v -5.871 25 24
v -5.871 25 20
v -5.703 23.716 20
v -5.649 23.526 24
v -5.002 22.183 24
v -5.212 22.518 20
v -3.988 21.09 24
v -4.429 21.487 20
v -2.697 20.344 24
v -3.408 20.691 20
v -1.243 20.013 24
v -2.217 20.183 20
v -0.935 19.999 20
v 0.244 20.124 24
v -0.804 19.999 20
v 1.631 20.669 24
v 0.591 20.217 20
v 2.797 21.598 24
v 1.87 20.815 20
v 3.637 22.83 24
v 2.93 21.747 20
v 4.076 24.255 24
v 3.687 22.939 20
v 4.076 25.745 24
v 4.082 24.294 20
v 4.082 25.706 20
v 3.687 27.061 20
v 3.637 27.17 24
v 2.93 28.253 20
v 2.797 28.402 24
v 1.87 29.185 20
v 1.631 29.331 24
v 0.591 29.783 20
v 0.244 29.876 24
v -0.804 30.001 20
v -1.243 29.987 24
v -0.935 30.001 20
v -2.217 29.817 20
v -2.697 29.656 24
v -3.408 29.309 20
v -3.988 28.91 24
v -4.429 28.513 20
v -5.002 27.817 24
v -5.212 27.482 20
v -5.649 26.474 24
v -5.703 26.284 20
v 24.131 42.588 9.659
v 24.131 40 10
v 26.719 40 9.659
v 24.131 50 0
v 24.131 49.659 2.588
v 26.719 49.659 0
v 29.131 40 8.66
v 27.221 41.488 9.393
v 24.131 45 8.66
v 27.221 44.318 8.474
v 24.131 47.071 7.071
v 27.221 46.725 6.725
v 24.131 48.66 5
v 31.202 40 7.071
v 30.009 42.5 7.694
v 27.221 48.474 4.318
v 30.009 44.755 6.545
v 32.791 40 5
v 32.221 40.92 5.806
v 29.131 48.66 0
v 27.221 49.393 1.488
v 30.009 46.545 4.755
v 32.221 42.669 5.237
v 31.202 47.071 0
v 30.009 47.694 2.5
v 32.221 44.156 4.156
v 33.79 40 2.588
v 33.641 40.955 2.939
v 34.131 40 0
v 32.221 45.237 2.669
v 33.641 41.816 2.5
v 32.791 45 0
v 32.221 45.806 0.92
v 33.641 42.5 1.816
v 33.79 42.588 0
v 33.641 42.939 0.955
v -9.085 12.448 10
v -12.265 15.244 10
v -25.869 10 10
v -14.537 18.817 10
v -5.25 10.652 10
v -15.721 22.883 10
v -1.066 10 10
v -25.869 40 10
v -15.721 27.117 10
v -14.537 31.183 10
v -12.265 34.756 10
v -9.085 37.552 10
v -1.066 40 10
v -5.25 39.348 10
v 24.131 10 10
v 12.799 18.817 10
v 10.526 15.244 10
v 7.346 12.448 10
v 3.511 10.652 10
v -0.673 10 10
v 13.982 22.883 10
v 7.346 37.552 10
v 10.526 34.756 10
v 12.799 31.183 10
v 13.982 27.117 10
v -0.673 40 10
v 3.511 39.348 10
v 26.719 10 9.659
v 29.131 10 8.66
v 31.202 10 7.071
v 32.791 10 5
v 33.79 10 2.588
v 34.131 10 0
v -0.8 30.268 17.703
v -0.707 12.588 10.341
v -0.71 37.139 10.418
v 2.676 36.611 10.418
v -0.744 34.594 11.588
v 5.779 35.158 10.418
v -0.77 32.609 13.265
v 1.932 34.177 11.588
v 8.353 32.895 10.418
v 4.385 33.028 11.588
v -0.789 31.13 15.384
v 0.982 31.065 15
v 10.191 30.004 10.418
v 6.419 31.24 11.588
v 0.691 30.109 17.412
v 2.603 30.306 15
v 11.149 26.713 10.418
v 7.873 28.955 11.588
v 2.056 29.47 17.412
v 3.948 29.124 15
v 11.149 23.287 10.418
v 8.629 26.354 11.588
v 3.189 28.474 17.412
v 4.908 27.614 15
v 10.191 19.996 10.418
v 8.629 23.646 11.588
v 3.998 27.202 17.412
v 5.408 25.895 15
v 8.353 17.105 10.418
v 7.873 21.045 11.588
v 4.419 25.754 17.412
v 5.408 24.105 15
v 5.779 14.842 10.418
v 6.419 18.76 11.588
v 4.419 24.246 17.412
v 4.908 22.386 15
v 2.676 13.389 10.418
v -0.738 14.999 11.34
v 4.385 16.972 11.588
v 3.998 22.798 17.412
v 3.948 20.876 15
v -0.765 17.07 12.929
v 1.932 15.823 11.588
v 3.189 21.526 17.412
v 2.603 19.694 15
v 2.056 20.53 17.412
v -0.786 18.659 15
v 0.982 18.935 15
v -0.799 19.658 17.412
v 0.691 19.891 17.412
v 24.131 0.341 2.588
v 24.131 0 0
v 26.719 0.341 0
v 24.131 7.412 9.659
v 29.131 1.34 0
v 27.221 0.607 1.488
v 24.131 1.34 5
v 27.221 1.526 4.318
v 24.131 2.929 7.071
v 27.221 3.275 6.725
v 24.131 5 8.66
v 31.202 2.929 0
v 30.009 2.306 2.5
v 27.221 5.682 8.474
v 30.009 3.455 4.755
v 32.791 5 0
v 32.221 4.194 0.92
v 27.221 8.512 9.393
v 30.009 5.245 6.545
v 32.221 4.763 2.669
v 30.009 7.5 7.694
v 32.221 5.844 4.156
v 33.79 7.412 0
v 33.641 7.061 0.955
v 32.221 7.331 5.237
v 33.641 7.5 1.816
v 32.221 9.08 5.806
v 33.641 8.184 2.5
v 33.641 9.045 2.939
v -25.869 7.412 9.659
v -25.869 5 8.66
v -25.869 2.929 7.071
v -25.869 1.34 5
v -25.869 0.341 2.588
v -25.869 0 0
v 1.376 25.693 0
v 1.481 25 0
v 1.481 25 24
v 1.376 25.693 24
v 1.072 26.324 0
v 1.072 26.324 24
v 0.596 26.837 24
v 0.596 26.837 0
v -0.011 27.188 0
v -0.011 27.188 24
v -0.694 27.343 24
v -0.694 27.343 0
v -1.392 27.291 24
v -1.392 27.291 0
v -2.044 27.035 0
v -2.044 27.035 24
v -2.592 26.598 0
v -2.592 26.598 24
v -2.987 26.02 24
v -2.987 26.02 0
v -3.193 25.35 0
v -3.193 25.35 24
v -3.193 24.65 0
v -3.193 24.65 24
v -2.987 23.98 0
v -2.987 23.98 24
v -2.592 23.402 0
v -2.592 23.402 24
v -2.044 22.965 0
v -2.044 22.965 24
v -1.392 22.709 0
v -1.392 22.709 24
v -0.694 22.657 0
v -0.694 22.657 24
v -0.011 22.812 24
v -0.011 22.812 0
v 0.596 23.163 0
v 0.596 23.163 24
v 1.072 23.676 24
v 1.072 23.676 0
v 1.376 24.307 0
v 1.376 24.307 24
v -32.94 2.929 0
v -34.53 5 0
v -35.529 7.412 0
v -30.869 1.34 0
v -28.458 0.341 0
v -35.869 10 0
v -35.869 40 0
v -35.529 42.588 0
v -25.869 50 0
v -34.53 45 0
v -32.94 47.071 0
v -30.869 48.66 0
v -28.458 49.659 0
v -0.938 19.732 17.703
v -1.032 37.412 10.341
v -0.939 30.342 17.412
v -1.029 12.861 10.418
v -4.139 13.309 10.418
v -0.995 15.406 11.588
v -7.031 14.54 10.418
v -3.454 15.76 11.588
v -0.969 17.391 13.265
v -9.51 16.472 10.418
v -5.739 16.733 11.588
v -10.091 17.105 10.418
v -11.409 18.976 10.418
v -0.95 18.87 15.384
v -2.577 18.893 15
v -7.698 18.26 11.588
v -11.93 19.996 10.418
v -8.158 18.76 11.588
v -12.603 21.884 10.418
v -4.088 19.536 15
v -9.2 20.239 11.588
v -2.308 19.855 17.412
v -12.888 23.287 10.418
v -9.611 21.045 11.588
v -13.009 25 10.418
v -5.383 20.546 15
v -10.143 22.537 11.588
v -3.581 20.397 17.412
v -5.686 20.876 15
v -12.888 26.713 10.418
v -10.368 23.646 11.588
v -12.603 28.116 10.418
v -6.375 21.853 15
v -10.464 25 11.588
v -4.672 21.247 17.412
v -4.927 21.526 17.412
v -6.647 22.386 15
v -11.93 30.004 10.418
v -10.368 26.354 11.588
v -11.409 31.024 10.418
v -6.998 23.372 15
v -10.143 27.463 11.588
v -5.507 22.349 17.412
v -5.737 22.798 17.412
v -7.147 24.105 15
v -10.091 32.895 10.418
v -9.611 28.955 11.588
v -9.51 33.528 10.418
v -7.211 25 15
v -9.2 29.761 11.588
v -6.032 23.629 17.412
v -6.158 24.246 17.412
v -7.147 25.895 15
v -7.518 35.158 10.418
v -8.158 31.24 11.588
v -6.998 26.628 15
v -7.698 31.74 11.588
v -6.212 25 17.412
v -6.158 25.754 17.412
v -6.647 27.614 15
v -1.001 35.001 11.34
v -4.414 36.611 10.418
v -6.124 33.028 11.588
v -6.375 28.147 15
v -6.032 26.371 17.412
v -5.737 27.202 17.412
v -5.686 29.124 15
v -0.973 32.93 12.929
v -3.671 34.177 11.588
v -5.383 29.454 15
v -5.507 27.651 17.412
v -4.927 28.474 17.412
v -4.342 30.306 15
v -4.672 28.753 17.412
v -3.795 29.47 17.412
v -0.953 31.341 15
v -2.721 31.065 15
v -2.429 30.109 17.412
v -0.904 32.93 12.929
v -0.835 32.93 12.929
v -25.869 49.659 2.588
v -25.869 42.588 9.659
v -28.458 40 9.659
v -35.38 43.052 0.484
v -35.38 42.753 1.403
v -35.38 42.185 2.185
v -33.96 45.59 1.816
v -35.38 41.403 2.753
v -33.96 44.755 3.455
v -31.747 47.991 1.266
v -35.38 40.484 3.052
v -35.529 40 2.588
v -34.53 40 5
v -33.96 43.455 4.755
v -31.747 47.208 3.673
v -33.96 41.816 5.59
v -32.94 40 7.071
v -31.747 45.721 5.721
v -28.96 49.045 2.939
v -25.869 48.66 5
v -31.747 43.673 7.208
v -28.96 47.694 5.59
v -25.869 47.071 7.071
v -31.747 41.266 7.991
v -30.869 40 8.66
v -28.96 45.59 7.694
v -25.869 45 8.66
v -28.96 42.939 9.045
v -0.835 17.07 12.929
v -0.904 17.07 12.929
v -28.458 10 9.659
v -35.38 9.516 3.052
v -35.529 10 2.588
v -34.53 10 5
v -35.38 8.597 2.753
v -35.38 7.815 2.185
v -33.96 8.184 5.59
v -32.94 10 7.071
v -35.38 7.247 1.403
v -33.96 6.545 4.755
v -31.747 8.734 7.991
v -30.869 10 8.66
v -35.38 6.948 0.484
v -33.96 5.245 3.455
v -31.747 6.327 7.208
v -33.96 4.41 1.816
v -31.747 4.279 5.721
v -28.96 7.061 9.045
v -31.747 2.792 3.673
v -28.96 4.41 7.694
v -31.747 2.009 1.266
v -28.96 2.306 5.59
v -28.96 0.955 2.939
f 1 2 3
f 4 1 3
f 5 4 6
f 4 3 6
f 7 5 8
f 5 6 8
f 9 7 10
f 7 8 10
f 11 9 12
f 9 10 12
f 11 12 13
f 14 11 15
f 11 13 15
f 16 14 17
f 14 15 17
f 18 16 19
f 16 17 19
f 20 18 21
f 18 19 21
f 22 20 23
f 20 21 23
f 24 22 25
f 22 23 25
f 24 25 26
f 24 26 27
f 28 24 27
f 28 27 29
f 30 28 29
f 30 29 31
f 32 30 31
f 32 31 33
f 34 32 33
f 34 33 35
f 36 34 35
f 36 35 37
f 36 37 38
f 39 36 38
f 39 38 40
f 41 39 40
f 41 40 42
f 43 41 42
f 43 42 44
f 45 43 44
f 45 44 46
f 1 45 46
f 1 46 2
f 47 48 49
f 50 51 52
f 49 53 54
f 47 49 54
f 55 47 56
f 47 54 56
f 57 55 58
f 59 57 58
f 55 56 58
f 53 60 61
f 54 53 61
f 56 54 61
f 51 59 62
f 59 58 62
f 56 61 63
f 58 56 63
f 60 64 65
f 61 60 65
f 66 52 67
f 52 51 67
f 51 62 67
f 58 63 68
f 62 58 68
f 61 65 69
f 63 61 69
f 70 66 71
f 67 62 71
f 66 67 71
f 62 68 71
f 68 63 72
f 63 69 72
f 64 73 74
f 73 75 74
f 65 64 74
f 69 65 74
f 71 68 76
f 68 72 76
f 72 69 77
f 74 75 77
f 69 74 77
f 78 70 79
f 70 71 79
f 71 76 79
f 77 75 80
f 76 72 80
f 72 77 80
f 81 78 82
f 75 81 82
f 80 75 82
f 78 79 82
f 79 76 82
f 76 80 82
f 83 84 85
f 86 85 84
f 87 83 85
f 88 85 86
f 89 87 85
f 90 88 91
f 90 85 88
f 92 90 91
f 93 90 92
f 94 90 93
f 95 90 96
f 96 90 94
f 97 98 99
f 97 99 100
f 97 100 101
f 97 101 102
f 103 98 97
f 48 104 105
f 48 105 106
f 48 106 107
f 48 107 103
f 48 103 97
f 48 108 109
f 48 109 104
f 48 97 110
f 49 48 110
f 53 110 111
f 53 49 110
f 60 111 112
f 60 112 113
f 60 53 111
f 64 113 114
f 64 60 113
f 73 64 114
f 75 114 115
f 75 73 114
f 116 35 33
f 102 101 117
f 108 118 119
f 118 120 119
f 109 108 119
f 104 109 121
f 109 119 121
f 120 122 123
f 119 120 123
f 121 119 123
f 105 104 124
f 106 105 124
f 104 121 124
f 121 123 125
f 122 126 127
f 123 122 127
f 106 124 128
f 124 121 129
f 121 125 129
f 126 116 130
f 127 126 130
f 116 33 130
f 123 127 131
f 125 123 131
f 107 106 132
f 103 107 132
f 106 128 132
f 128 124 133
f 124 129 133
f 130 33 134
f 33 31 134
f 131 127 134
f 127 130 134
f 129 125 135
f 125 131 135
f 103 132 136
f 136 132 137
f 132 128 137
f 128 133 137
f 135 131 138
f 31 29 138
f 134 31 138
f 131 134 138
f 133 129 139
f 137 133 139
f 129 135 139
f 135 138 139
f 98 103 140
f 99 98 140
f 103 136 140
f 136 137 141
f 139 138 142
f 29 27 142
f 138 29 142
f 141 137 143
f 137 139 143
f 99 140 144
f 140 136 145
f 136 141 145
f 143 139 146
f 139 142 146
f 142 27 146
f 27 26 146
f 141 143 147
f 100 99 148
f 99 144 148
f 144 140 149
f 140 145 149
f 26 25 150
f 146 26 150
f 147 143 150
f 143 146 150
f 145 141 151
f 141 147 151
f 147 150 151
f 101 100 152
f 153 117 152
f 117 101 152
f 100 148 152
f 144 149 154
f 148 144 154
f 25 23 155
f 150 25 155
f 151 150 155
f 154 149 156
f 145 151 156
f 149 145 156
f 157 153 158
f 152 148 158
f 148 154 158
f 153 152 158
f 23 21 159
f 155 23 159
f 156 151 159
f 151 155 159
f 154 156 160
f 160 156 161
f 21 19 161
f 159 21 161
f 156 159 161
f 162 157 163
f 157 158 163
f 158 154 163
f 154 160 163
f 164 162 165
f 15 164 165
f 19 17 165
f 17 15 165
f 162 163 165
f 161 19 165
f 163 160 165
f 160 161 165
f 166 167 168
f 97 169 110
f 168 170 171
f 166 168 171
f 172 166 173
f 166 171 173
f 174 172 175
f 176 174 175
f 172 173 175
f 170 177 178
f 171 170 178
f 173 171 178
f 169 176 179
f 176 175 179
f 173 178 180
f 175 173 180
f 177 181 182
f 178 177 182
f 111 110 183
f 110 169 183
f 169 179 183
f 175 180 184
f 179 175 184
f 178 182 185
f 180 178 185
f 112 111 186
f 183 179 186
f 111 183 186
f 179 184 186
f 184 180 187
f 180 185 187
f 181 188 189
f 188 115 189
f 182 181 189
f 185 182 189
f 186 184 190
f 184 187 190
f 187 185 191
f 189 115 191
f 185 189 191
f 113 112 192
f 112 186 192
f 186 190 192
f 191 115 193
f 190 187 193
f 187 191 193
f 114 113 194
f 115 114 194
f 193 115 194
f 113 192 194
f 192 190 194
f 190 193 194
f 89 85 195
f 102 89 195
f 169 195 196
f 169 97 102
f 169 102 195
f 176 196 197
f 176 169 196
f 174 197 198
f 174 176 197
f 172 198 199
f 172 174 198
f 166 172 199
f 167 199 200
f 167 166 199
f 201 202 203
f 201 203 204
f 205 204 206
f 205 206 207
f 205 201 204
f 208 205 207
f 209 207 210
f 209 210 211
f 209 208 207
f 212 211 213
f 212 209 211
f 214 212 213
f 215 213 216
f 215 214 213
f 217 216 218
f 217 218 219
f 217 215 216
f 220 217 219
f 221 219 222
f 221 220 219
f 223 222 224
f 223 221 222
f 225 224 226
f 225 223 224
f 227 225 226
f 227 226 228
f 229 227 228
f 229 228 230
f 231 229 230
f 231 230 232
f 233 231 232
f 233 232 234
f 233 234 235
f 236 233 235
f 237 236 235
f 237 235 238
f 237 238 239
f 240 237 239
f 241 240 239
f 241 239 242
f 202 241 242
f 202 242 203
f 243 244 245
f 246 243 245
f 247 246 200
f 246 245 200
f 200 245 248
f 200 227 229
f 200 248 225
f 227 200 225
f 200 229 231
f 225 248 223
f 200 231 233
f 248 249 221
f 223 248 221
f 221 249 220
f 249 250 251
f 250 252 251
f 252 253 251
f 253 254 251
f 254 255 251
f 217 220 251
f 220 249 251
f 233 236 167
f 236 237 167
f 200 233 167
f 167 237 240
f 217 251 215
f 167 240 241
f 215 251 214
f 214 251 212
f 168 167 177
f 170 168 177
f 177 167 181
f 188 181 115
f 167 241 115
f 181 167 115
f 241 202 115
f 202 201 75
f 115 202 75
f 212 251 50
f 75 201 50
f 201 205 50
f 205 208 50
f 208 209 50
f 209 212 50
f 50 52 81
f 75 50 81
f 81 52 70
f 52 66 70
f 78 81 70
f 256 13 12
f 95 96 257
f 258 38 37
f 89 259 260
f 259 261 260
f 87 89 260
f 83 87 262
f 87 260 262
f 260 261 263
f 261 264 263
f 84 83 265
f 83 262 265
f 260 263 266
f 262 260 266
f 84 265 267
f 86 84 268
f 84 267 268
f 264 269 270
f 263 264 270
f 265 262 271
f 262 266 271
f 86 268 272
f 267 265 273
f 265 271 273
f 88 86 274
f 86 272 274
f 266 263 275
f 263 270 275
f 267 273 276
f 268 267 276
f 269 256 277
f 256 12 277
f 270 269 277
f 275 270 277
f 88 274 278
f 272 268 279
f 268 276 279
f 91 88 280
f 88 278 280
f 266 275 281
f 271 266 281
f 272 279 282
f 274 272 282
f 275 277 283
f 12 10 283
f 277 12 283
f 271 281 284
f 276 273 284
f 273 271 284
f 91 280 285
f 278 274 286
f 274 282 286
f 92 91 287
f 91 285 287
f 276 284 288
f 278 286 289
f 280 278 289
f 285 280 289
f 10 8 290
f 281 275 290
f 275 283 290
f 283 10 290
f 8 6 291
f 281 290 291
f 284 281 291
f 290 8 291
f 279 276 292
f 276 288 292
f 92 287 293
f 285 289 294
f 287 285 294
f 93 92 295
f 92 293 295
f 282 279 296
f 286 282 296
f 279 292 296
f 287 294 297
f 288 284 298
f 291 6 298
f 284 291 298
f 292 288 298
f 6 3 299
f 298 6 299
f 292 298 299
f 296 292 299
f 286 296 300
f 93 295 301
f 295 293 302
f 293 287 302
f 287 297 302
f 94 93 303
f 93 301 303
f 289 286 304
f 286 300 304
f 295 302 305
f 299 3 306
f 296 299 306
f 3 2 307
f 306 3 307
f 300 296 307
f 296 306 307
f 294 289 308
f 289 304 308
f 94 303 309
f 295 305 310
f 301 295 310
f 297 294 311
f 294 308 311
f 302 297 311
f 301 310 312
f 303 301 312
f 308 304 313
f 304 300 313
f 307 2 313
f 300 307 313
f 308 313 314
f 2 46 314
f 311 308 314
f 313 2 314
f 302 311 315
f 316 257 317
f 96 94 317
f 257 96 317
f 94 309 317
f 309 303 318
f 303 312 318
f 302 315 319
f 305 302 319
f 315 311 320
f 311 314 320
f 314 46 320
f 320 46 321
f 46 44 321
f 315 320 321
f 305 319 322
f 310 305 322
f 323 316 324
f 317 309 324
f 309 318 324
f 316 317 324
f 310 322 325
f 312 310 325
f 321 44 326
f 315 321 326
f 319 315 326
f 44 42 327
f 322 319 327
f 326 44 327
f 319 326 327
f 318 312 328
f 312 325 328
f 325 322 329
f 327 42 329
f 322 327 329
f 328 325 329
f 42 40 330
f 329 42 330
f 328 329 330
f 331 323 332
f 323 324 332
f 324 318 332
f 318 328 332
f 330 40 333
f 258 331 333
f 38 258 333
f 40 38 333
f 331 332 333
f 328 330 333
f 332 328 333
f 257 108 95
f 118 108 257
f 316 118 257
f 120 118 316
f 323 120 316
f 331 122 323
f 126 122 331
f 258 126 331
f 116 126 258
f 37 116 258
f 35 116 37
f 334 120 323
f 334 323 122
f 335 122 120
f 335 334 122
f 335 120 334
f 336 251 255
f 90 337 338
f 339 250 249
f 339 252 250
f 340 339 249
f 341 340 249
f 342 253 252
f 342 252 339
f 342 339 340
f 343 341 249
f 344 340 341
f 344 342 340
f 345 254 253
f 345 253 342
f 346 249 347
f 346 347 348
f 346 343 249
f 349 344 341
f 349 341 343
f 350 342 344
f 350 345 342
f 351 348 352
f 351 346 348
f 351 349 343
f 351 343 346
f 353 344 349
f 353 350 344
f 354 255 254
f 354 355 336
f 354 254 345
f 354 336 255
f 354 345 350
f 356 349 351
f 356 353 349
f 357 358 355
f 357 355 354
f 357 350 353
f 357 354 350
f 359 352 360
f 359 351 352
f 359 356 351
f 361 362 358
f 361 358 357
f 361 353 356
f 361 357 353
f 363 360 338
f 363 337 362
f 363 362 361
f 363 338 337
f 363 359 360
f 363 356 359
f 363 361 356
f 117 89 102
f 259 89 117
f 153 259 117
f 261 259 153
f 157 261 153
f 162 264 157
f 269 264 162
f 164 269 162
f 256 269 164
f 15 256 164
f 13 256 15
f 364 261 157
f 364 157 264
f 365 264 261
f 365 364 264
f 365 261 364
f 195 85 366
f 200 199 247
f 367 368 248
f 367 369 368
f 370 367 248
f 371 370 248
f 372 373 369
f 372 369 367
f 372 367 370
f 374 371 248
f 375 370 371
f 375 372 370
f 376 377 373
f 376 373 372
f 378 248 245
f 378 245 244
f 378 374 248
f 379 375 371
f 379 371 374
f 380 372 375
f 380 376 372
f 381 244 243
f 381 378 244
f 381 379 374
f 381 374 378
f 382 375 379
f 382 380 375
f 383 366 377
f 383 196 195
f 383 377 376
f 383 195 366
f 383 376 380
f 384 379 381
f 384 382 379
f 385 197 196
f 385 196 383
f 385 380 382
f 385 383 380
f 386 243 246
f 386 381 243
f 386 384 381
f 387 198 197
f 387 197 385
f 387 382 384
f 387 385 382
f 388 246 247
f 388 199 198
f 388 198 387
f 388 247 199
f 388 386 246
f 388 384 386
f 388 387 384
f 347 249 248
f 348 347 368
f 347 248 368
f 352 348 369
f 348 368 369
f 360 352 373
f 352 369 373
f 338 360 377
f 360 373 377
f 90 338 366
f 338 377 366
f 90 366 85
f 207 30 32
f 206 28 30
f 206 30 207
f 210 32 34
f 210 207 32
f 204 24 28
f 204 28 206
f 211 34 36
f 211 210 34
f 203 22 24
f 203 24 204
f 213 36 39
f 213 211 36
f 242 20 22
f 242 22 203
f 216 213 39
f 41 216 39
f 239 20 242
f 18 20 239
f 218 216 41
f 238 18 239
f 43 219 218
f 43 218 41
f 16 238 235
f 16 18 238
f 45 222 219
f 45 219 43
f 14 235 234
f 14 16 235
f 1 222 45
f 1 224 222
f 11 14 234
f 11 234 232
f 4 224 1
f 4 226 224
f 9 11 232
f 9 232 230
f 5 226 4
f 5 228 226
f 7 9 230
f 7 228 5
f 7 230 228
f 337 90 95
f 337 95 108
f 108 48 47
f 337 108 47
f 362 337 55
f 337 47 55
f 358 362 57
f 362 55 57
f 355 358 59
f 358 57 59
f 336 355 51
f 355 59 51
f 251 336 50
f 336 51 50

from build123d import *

# Parameters (mm, degrees)
ESBO_O1_W                = 70
ESBO_O1_H                = 50
ESBO_O1_R                = 2.35
RESSALTO_EXTRUS_O1_DEPTH = 10
ESBO_O2_R                = 5.001389376
ESBO_O2_R_2              = 2.35
RESSALTO_EXTRUS_O2_DEPTH = 24
FILETE1_R                = 10
FILETE2_R                = 10
FILETE3_R                = 10
FILETE4_R                = 10
FILETE5_R                = 10


with BuildPart() as part:
    # Esboço1 → Ressalto-extrusão1 (new body)
    with BuildSketch(Plane.XY):
        with Locations((-0.869381548, 25)):
            Rectangle(ESBO_O1_W, ESBO_O1_H)
        with Locations((-0.869381548, 25)):
            Circle(ESBO_O1_R, mode=Mode.SUBTRACT)
    extrude(amount=RESSALTO_EXTRUS_O1_DEPTH)

    # Esboço2 → Ressalto-extrusão2 (add)
    with BuildSketch(Plane.XY):
        with Locations(Location((-0.869381548, 25, 0), (0, 0, 180))):
            Circle(ESBO_O2_R)
        with Locations((-0.869381548, 25)):
            Circle(ESBO_O2_R_2, mode=Mode.SUBTRACT)
    extrude(amount=RESSALTO_EXTRUS_O2_DEPTH)

    # Filete1
    filete1_edges = [part.edges().sort_by_distance(p)[0] for p in [
        (-0.869381548, 0, 10),
    ]]
    fillet(filete1_edges, radius=FILETE1_R - 0.0001)  # a hair under: the kernel refuses the full size

    # Filete2
    filete2_edges = [part.edges().sort_by_distance(p)[0] for p in [
        (-0.869381548, 50, 10),
    ]]
    fillet(filete2_edges, radius=FILETE2_R - 0.0001)  # a hair under: the kernel refuses the full size

    # Filete3
    filete3_edges = [part.edges().sort_by_distance(p)[0] for p in [
        (-35.869381548, 2.928902899, 7.071097101),
        (-35.869381548, 25, 10),
        (-35.869381548, 47.071097101, 7.071097101),
    ]]
    fillet(filete3_edges, radius=FILETE3_R - 0.0001)  # a hair under: the kernel refuses the full size

    # Filete4
    filete4_edges = [part.edges().sort_by_distance(p)[0] for p in [
        (34.130618452, 25, 10),
        (34.130618452, 2.928902899, 7.071097101),
        (34.130618452, 47.071097101, 7.071097101),
    ]]
    fillet(filete4_edges, radius=FILETE4_R - 0.0001)  # a hair under: the kernel refuses the full size

    # Filete5
    filete5_edges = [part.edges().sort_by_distance(p)[0] for p in [
        (4.132007829, 25, 10),
    ]]
    fillet(filete5_edges, radius=FILETE5_R)


solid = part.part
